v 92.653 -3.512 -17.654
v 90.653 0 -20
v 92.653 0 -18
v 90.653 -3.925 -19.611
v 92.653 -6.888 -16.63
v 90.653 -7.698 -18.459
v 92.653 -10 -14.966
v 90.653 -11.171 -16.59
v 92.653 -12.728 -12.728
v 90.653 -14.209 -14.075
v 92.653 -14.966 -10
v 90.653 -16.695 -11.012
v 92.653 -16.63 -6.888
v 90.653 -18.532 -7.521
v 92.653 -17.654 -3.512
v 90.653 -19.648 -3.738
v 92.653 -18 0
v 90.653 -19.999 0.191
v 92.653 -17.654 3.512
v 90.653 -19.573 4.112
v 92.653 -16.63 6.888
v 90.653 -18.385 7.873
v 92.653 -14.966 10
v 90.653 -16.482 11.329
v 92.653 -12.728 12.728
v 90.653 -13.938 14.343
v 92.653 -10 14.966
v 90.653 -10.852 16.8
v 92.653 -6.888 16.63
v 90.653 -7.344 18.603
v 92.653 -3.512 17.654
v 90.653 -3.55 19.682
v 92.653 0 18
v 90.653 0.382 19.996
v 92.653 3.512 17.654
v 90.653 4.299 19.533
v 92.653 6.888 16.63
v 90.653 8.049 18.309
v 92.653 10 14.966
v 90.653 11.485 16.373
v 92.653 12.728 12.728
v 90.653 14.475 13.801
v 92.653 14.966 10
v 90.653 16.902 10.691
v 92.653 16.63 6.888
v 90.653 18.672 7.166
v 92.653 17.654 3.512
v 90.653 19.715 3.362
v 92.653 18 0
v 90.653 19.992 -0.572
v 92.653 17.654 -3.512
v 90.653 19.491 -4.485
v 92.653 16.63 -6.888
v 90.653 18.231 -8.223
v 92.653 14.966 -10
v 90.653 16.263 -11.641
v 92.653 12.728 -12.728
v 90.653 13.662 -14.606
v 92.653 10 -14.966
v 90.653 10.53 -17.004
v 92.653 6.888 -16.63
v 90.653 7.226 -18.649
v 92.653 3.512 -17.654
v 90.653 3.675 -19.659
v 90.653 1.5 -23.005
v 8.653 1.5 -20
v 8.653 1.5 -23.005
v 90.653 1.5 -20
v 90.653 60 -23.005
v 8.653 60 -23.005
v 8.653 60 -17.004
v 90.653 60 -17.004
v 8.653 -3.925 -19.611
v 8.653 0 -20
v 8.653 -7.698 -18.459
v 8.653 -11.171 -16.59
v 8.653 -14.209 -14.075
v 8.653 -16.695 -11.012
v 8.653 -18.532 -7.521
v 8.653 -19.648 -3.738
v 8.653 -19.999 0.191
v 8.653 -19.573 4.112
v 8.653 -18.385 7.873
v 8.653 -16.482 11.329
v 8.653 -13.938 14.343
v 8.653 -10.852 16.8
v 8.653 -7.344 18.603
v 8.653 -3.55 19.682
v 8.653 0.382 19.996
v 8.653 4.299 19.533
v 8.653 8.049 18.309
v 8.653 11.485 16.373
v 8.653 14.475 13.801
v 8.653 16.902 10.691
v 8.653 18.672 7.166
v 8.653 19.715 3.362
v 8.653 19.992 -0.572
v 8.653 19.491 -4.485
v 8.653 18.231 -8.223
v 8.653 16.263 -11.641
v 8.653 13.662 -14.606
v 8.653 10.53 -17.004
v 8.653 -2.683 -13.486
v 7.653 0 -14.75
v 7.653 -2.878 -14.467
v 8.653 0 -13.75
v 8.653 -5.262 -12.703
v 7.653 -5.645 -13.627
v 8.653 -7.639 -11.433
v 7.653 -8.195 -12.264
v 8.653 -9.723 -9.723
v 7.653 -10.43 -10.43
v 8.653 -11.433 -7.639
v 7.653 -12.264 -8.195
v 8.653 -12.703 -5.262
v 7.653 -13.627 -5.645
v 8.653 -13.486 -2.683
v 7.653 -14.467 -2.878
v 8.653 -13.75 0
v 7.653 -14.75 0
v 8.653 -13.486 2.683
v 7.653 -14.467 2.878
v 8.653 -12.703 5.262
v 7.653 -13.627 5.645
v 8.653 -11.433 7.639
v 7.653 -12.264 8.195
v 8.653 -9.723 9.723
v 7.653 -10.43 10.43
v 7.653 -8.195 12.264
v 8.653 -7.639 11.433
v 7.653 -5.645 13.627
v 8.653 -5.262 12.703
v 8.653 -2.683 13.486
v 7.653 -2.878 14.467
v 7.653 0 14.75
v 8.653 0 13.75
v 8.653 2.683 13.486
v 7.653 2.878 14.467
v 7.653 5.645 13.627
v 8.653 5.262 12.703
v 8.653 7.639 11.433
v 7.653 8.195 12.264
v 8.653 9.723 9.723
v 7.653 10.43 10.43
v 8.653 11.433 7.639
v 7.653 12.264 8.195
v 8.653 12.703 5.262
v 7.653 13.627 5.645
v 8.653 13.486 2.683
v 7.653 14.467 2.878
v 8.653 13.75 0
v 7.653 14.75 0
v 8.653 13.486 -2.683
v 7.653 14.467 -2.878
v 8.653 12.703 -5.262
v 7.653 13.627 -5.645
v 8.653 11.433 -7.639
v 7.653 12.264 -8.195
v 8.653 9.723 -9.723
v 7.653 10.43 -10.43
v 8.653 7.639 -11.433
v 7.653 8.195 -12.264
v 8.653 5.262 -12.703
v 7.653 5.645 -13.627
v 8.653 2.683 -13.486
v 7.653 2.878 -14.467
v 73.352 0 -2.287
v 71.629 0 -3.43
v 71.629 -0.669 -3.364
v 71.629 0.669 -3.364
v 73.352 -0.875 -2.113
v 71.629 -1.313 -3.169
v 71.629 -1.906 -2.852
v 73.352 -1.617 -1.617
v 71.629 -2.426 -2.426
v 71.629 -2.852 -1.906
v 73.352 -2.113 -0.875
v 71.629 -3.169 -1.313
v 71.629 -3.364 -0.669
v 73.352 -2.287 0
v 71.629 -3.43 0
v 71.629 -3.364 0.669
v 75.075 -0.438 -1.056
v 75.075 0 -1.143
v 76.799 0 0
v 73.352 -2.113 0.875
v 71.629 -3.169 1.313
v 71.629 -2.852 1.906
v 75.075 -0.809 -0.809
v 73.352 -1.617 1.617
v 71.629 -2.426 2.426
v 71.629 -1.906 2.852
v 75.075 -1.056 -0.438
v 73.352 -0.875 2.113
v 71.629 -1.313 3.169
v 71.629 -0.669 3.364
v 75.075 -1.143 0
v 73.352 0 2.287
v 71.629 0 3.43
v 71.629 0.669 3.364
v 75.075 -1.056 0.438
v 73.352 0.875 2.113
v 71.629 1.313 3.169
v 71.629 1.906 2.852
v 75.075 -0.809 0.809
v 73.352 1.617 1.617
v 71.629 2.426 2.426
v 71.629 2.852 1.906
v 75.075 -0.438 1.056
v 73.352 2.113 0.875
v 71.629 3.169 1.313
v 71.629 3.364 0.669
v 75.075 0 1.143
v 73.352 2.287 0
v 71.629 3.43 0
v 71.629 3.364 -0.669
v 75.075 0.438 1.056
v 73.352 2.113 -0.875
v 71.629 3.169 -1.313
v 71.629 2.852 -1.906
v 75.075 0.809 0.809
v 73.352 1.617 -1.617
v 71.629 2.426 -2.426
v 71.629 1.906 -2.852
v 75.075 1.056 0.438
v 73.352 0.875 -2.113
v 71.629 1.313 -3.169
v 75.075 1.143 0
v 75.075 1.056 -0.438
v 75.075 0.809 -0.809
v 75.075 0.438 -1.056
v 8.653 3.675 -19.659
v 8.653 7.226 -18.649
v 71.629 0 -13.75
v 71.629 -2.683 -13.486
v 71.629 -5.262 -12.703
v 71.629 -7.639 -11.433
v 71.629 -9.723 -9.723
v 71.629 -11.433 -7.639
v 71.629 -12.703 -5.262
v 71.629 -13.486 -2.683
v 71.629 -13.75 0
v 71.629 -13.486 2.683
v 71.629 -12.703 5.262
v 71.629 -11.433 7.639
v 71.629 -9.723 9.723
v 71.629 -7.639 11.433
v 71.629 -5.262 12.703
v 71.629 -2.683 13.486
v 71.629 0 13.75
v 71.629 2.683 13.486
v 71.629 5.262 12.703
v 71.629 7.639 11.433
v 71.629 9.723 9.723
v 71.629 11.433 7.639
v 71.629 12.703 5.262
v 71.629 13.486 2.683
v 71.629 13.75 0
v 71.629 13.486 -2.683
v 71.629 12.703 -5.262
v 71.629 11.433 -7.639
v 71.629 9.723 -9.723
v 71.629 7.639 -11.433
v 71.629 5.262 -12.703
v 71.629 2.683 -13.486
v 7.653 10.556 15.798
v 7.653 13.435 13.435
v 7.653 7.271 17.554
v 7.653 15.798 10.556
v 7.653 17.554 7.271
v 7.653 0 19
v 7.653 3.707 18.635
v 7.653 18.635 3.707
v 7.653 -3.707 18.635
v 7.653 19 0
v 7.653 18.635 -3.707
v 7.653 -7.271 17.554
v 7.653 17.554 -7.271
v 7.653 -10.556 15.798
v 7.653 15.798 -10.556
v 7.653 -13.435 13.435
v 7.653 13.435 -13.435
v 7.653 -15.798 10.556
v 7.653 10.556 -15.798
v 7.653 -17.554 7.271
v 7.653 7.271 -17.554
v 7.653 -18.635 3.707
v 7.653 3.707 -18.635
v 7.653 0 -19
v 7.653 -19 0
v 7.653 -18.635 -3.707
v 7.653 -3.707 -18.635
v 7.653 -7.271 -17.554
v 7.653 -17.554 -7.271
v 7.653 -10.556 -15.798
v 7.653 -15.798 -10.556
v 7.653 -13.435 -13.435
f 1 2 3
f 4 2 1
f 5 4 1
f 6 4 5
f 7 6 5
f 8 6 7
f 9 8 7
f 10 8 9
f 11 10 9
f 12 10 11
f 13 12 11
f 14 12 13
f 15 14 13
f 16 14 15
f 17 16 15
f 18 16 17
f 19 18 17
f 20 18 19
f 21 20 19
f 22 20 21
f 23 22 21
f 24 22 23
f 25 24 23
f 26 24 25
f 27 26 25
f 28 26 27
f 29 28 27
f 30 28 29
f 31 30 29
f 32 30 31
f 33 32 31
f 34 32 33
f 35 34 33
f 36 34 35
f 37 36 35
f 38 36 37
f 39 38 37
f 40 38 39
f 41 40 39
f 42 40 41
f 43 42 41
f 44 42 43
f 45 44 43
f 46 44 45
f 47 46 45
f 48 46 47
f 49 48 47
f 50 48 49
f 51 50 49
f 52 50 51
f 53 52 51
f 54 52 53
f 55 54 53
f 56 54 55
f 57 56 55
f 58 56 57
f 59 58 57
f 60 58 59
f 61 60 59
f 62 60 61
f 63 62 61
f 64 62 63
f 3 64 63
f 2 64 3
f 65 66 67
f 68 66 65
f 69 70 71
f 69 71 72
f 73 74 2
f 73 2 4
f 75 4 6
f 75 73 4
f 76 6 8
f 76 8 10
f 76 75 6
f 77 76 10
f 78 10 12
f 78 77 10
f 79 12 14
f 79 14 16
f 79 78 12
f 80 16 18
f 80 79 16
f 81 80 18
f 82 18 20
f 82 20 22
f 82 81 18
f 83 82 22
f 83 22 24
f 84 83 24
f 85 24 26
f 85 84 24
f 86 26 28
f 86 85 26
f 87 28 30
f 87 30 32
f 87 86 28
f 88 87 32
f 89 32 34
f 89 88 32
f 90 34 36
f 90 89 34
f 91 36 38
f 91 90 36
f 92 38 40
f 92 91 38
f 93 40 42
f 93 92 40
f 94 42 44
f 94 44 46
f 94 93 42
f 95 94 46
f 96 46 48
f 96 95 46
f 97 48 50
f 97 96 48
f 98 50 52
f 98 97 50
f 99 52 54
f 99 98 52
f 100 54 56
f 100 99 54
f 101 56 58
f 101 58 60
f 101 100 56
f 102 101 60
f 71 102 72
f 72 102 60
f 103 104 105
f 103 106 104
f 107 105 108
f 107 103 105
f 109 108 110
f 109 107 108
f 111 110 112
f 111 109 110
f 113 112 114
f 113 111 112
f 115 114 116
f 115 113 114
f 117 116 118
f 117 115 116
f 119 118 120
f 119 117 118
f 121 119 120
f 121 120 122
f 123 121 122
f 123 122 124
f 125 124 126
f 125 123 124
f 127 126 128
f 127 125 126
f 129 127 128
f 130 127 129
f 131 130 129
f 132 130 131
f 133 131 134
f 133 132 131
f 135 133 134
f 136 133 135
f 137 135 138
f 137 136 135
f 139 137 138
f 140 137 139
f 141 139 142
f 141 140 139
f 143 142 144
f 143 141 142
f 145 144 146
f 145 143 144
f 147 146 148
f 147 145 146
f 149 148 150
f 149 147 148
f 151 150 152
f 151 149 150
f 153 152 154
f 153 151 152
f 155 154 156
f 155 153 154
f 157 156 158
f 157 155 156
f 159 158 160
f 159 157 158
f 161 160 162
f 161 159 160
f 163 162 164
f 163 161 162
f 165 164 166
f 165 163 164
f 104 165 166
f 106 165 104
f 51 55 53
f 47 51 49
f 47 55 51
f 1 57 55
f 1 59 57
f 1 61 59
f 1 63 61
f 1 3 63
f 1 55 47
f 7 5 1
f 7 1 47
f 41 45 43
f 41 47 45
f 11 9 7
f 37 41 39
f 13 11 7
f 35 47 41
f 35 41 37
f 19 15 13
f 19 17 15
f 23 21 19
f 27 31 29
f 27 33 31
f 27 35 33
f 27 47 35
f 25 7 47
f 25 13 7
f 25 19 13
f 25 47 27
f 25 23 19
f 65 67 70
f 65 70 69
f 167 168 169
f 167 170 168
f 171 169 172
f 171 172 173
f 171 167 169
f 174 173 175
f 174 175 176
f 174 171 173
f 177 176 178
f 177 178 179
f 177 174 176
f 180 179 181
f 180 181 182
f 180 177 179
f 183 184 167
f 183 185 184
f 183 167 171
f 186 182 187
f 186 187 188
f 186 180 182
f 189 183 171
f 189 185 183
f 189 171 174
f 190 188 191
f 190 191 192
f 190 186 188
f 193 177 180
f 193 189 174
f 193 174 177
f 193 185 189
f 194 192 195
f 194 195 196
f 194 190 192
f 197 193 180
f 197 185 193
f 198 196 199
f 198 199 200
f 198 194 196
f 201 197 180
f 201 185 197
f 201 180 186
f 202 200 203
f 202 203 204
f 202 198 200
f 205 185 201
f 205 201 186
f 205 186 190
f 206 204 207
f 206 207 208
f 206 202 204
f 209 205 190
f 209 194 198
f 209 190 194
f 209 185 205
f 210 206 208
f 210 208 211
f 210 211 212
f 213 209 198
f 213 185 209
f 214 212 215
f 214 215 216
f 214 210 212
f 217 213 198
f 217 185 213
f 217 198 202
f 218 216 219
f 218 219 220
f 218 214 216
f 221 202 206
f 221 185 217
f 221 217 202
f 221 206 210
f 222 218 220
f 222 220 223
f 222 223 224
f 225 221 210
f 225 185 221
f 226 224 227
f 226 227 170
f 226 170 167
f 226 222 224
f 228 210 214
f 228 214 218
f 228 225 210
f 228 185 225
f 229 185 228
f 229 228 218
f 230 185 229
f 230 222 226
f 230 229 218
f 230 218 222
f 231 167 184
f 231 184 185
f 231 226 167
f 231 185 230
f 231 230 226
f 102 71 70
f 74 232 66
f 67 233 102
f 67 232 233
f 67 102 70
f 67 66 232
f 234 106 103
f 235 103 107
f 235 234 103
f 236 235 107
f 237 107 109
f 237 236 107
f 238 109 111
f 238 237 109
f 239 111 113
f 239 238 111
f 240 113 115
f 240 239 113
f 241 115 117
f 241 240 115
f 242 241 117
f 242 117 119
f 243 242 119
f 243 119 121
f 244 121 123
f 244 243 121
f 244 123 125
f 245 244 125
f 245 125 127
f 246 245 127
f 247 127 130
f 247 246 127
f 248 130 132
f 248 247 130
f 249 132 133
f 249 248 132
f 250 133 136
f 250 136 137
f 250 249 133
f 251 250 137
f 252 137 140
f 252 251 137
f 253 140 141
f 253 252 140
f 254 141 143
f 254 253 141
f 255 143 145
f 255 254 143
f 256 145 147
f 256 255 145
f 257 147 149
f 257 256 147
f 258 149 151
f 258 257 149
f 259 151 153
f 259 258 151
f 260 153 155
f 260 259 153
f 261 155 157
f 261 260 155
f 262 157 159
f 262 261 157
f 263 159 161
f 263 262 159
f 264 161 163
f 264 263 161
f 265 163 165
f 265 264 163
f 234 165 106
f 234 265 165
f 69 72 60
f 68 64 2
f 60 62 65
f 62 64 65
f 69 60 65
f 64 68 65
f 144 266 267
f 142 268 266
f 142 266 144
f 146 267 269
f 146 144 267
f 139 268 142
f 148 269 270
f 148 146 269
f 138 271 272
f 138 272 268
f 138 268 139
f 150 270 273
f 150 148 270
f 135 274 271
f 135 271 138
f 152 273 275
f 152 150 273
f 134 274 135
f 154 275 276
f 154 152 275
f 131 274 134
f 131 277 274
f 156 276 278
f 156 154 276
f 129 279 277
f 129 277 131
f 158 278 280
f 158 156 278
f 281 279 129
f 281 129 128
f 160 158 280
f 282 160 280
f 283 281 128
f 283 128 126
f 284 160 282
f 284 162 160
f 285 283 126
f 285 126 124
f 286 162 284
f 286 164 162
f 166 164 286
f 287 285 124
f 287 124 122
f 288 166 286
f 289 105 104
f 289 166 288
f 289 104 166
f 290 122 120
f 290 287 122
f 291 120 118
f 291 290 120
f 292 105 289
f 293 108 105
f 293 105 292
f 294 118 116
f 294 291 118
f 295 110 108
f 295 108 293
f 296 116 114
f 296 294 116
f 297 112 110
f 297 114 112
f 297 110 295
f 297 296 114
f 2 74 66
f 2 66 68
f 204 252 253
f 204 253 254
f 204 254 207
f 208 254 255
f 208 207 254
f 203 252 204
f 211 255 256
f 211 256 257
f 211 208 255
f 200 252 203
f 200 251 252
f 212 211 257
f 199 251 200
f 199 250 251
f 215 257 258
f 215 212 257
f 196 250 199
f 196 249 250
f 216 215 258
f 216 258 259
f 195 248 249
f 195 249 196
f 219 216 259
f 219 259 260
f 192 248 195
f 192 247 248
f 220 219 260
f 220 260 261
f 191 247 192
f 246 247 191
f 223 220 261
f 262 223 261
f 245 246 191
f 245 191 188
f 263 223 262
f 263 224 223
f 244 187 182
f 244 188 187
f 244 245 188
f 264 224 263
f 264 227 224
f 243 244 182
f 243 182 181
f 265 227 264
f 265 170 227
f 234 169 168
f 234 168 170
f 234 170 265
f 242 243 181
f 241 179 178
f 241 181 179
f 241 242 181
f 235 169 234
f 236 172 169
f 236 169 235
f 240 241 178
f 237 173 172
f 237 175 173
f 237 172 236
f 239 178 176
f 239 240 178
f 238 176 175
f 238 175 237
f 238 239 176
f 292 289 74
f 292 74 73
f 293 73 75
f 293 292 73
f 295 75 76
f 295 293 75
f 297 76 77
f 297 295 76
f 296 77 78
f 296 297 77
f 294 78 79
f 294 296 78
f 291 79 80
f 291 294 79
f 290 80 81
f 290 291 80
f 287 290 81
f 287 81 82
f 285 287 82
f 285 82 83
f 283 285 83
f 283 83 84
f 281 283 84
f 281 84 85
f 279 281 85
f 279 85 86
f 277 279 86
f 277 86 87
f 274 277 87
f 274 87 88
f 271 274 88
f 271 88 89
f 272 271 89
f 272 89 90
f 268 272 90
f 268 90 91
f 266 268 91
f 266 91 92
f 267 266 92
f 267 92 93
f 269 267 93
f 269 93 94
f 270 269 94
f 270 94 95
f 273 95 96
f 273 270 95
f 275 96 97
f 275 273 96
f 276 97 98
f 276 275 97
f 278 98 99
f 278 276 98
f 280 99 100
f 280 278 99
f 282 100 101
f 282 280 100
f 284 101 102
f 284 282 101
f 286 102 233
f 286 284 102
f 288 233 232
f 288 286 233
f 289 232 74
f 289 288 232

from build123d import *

# Parameters (mm, degrees)
SKETCH_2_W          = 82
SKETCH_2_H          = 6.001237201
EXTRUDE_1_DEPTH     = 60
SKETCH_3_W          = 82
SKETCH_3_H          = 3.004928021
CUT_EXTRUDE_1_DEPTH = 1.5


with BuildPart() as part:
    # Эскиз1 → Повернуть4 (revolve)
    with BuildSketch(Plane(origin=(0, 0, 0), x_dir=(1, 0, 0), z_dir=(0, 1, 0))):
        Polygon((92.65287472, 0), (92.65287472, 18), (90.65287472, 20), (8.65287472, 20), (7.65287472, 19), (7.65287472, 14.750046626), (8.65287472, 13.750046626), (71.629429714, 13.750046626), (71.629429714, 3.430205497), (76.798526349, 0), align=None)
    revolve(axis=Axis((102.994030824, 0, 0), (-1, 0, 0)))

    # Эскиз2 → Бобышка-Вытянуть1 (add)
    with BuildSketch(Plane(origin=(0, 0, 0), x_dir=(1, 0, 0), z_dir=(0, 1, 0))):
        with Locations((49.65287472, 20.004309421)):
            Rectangle(SKETCH_2_W, SKETCH_2_H)
    extrude(amount=EXTRUDE_1_DEPTH)

    # Эскиз3 → Вырез-Вытянуть1 (cut)
    with BuildSketch(Plane.XZ):
        with Locations((49.65287472, -21.50246401)):
            Rectangle(SKETCH_3_W, SKETCH_3_H)
    extrude(amount=-CUT_EXTRUDE_1_DEPTH, mode=Mode.SUBTRACT)


solid = part.part
